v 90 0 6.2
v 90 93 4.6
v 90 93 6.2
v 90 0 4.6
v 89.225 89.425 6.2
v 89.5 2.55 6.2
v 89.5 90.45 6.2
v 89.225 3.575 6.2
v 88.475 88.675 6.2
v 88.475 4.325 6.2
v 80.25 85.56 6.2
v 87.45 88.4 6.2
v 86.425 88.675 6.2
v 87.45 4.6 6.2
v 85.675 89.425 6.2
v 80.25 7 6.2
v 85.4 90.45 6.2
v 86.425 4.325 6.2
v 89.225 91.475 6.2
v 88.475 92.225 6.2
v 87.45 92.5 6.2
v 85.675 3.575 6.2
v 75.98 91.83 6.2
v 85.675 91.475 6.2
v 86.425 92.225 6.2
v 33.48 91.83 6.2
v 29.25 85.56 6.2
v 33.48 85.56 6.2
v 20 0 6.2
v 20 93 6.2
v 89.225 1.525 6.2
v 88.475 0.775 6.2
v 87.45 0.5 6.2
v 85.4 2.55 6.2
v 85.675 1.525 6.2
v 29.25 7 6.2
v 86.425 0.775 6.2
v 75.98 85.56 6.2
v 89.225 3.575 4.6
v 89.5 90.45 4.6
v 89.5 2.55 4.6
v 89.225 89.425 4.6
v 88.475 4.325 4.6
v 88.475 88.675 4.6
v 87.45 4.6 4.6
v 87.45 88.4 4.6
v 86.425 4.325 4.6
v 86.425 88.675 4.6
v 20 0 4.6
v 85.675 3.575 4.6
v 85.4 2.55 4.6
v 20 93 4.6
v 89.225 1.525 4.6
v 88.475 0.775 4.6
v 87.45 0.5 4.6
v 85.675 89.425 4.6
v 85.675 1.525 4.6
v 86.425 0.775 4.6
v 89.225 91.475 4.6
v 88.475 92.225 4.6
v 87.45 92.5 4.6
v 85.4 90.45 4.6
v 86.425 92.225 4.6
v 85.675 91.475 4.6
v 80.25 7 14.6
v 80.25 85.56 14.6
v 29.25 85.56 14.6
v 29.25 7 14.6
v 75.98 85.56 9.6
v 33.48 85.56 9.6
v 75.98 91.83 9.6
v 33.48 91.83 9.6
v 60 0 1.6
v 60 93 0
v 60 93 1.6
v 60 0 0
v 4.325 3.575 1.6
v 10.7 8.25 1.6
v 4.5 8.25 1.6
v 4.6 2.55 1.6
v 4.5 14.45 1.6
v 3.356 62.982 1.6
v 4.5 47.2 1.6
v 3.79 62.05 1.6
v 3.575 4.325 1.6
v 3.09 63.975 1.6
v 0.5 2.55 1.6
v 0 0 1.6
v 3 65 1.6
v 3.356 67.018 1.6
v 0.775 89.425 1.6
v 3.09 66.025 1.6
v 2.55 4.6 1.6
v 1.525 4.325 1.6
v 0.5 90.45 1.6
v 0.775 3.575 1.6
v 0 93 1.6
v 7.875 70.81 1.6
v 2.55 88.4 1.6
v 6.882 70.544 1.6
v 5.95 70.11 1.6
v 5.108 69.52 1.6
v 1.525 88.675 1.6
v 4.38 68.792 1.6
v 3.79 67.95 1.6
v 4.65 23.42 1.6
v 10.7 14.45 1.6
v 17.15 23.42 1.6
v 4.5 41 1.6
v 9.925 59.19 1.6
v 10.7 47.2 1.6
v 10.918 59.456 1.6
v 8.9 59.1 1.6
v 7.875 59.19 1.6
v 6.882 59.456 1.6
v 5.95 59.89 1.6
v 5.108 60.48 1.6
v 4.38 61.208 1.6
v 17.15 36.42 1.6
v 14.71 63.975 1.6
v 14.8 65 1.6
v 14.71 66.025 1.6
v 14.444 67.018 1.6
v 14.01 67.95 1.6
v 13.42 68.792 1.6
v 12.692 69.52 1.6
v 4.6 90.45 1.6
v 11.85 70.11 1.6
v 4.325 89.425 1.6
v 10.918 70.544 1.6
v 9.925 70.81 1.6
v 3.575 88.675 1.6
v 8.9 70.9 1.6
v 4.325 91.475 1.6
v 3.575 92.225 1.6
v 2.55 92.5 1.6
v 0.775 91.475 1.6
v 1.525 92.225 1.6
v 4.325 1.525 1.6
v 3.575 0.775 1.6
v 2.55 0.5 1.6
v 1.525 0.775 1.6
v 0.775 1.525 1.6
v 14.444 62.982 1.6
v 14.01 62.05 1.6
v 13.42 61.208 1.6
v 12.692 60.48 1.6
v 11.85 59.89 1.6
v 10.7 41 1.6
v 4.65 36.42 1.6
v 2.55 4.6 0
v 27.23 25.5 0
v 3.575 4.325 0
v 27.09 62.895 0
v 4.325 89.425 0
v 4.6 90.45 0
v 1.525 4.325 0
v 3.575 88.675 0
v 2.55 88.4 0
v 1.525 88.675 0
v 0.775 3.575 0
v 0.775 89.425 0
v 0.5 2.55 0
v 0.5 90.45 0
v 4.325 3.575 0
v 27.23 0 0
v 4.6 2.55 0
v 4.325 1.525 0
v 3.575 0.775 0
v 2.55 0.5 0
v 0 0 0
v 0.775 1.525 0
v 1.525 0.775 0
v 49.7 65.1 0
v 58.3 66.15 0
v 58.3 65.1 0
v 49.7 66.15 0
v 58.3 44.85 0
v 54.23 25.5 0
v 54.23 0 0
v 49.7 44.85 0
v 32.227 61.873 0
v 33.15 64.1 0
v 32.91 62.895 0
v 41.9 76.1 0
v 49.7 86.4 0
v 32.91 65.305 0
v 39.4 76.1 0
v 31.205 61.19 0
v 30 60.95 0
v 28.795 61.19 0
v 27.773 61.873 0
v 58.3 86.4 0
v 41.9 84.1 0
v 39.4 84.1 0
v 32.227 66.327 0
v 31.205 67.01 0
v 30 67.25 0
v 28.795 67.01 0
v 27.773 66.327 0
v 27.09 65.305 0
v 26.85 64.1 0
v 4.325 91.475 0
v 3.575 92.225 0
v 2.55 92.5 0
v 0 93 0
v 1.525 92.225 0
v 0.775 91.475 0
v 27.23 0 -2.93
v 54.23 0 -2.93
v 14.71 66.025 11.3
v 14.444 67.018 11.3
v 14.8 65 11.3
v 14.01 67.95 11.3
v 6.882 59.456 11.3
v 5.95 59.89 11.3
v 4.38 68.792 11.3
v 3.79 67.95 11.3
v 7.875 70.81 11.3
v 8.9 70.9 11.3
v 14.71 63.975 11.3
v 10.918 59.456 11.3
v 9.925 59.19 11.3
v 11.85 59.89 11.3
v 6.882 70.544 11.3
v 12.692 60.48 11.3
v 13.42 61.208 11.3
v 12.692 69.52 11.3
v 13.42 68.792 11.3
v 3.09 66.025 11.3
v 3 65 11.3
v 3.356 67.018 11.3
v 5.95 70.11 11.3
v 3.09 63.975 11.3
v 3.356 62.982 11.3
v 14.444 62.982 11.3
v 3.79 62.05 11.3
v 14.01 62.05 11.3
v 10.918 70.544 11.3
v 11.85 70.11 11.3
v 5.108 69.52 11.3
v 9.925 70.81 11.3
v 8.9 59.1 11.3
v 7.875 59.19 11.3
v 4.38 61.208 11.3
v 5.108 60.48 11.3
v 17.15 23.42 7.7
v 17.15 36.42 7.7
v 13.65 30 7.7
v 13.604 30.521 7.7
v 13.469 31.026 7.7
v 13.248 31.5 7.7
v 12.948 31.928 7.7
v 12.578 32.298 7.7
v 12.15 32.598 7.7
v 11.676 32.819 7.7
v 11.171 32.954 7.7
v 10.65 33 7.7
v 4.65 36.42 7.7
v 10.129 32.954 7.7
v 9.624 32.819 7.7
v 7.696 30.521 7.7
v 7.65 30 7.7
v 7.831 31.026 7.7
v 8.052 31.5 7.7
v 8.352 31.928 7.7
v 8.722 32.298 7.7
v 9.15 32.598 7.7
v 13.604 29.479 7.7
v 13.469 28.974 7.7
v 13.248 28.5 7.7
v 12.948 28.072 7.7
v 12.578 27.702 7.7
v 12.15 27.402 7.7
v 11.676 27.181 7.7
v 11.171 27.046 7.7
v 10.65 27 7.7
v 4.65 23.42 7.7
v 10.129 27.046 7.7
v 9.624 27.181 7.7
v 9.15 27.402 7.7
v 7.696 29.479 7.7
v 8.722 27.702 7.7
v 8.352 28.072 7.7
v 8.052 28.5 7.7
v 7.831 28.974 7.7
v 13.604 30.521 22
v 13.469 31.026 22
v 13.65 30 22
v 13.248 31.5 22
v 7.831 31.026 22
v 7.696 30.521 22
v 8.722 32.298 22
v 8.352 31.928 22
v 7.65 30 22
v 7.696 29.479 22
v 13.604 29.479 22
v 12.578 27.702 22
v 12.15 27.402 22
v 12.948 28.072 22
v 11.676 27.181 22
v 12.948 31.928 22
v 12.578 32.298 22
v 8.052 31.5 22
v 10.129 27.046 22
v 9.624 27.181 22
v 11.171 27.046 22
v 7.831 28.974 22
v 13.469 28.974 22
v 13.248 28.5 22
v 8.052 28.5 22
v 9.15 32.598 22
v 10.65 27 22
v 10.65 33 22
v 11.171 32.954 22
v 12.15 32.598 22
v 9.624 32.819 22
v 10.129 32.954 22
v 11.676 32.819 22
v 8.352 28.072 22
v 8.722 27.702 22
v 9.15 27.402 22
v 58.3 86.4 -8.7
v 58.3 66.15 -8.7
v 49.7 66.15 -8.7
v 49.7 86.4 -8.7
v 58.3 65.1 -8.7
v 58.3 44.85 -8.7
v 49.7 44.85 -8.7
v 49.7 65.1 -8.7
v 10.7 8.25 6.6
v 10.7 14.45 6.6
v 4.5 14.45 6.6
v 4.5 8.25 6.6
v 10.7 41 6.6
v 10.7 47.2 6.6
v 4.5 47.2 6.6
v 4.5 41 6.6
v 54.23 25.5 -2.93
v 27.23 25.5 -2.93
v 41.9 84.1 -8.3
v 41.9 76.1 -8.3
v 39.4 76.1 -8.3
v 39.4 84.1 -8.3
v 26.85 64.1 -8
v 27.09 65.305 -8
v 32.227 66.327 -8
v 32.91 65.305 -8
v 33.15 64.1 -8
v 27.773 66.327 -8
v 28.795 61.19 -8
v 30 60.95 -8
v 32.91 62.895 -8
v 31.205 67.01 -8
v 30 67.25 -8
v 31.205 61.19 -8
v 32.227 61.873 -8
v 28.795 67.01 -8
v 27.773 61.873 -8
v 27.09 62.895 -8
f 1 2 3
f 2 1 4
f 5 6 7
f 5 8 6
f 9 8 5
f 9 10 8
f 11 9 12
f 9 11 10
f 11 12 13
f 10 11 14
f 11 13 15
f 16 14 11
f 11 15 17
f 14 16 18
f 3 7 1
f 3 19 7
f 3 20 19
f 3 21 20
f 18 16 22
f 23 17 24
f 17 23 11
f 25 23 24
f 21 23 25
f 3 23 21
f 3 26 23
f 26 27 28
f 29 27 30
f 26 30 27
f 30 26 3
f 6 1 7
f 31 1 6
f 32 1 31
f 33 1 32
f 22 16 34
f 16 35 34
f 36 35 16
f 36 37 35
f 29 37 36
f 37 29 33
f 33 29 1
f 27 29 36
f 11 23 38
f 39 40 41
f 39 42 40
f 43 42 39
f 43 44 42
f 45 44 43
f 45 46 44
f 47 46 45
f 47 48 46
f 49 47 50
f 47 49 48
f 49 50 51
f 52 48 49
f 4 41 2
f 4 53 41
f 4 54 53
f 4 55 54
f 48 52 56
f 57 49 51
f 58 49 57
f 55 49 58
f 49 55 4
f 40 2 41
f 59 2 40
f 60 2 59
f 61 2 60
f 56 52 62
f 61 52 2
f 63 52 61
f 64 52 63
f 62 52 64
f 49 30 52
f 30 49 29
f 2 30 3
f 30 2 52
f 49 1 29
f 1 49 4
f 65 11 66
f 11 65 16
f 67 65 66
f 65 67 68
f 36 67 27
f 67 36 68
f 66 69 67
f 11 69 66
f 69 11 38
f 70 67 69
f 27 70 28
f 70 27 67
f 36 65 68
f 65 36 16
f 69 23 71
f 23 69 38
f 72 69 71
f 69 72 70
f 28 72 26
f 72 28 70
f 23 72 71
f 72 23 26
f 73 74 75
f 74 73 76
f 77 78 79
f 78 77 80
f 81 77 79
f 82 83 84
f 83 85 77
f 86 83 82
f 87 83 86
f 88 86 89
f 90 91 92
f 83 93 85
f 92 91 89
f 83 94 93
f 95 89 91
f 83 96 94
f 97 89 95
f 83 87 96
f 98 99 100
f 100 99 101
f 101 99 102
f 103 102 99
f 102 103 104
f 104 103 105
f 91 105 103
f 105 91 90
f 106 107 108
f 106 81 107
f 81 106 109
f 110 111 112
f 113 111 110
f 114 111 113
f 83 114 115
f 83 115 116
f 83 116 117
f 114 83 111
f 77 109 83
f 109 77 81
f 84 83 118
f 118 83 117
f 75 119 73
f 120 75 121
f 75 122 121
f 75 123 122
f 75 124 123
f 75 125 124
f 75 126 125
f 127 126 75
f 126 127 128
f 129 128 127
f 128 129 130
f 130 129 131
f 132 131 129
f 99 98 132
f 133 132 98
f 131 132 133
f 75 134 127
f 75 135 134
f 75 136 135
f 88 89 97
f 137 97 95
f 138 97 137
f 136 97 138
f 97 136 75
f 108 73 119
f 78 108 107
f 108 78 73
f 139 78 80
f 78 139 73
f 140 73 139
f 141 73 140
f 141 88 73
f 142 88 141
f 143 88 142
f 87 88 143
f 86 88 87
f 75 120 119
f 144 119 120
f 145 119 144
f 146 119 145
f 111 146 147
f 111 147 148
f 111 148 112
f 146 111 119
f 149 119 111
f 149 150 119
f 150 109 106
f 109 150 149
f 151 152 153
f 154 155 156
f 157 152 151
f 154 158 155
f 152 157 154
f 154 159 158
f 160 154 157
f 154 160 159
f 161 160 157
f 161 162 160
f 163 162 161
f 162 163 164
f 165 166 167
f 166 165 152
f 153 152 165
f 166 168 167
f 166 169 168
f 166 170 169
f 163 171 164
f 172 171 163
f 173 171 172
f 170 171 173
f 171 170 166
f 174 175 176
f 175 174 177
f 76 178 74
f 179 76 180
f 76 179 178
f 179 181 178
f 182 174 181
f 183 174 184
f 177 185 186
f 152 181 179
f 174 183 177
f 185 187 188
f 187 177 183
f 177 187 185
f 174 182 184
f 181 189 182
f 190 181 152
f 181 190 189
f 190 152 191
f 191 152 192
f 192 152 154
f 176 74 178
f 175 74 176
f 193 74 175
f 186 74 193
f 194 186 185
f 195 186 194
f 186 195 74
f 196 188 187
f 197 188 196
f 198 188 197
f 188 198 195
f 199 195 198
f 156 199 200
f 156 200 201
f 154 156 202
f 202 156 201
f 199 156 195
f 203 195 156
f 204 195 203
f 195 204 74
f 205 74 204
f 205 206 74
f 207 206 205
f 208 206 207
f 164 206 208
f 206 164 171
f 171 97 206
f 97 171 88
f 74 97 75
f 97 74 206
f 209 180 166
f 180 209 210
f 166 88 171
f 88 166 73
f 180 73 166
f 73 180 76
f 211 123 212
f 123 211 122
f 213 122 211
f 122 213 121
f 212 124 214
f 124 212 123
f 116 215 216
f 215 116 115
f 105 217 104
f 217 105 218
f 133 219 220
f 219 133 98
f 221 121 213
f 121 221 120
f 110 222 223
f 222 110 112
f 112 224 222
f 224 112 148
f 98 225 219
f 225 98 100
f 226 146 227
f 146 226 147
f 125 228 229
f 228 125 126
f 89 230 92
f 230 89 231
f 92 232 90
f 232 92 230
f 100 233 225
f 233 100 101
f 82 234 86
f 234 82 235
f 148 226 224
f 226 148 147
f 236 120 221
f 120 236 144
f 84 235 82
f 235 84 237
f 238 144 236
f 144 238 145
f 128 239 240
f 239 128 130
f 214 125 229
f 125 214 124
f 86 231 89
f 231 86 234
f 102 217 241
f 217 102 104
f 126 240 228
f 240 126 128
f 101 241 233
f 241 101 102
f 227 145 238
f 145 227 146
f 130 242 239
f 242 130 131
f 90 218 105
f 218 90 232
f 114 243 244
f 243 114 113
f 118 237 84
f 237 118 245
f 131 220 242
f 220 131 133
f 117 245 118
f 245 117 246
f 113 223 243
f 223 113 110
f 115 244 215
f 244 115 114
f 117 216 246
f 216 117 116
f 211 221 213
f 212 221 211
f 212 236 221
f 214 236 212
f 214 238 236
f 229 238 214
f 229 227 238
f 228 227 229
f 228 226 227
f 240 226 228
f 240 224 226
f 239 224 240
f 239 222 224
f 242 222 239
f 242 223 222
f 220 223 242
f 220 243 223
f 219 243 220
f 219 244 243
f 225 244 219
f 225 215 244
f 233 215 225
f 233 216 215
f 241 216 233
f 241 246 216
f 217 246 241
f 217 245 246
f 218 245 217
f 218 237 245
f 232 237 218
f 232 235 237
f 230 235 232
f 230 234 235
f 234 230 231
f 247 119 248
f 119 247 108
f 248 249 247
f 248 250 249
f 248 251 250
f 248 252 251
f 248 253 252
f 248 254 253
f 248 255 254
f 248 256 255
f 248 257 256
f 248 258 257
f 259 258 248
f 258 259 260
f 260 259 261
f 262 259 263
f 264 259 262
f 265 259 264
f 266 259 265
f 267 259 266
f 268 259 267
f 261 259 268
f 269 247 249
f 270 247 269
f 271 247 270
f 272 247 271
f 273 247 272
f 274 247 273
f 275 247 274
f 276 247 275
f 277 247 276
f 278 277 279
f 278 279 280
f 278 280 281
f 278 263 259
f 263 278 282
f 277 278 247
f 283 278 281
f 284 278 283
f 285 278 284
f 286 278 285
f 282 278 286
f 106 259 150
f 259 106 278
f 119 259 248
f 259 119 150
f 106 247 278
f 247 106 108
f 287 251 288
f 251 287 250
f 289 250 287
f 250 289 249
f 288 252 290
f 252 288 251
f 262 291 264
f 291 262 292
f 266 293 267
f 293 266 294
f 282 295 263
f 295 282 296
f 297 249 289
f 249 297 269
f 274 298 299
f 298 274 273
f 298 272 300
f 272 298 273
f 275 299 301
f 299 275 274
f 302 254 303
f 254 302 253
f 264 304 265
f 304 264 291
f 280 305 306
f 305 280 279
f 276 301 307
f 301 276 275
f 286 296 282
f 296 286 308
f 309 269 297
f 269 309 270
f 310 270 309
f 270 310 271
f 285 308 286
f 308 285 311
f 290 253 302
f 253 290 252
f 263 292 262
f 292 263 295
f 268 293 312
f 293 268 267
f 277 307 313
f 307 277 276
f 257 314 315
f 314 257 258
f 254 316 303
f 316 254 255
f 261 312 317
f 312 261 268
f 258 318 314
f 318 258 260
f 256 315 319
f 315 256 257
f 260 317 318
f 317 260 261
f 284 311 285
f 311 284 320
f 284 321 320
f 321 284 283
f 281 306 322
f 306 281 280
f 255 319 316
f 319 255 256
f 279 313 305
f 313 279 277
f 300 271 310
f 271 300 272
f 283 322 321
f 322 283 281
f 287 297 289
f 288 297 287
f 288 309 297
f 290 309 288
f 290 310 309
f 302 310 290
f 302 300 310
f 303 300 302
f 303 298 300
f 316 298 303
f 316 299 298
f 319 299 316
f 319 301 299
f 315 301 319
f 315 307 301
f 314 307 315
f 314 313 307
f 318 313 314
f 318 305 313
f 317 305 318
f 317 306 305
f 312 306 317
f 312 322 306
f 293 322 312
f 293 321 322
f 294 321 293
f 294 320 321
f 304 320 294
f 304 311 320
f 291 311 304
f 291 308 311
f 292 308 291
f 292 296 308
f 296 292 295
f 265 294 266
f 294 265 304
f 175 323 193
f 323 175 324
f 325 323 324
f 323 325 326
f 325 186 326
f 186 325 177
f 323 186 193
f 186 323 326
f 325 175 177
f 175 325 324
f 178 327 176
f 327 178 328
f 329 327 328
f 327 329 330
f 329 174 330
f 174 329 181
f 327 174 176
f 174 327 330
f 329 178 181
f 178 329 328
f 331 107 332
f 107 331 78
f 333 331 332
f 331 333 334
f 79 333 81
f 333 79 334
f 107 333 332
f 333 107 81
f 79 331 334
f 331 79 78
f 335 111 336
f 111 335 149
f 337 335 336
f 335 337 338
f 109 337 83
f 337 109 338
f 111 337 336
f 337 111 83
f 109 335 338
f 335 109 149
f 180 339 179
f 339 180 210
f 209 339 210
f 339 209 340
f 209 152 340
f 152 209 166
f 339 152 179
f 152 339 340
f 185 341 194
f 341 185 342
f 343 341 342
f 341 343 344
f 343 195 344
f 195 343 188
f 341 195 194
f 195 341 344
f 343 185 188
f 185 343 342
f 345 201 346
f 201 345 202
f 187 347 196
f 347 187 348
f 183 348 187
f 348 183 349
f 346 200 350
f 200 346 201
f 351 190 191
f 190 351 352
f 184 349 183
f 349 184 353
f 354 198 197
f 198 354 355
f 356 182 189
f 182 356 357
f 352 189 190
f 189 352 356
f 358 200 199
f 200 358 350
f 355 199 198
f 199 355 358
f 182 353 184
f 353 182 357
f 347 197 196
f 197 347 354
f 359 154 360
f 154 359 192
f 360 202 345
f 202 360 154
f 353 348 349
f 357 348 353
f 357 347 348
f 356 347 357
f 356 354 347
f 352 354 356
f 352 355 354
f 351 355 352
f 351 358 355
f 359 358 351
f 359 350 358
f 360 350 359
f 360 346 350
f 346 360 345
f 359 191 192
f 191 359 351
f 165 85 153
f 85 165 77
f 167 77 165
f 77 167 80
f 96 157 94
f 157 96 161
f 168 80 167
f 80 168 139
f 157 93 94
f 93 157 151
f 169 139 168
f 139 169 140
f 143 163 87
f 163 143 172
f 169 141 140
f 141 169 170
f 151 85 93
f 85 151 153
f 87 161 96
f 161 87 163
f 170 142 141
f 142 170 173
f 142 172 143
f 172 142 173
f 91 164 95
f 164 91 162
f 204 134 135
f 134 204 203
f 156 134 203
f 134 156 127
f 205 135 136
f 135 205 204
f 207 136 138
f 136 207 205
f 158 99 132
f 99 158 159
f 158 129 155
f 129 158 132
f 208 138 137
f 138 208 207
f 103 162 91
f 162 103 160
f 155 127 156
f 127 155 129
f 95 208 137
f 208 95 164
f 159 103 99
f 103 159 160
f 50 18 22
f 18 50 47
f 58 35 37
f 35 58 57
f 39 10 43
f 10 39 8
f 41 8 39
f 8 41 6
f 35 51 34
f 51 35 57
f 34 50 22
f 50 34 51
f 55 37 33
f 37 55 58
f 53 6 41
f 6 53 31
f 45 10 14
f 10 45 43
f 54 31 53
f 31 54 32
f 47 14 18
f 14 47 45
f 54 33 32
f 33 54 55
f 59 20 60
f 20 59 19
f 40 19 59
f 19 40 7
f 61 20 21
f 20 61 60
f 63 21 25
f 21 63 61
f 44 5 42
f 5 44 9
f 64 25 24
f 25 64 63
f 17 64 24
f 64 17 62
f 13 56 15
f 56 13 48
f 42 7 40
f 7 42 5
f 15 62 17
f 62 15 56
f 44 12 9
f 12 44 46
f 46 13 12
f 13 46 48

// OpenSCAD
difference() {
	union(){
		translate([20,0,4.6]) cube([70,93,1.6]); //lcd board
		translate([29.25,7,6.2])cube([51,78.56,8.4]); //lcd screen
		translate([33.48,85.56,6.2])cube([42.5,6.27,3.4]); //lcd screen connector pad
		

		cube([60,93,1.6]); //controller board

		translate([8.9,65,1.6])cylinder(r=5.9,h=9.7,$fn=36); //speaker

		translate([4.65,23.42,1.6])cube([12.5,13,6.1]); // encoder
		translate([10.65,30,1.6])cylinder(r=3,h=20.4,$fn=36);

		translate([49.7,66.15,-8.7]) cube([8.6,20.25,8.7]); // 2 2x5 pin connectors
		translate([49.7,44.85,-8.7]) cube([8.6,20.25,8.7]);

		translate([4.5,8.25,1.6])cube([6.2,6.2,5]);	//light toggle switch

		translate([4.5,41.,1.6])cube([6.2,6.2,5]);	//emergency stop switch
	
		translate([27.23,0,-2.93]) cube([27,25.5,2.93]); // sd card slot

		translate([39.4,76.1,-8.3]) cube([2.5,8,8.3]); // light mode jumper pins
		translate([30,64.1,-8]) cylinder(r=3.15,h=8,$fn=16); // capacitor
	}

	translate([2.55,2.55,0])cylinder(r=2.05,h=1.6,$fn=12); // mounting holes
	translate([2.55,90.45,0])cylinder(r=2.05,h=1.6,$fn=12);
	translate([87.45,2.55,4.6])cylinder(r=2.05,h=1.6,$fn=12);
	translate([87.45,90.45,4.6])cylinder(r=2.05,h=1.6,$fn=12);
}
